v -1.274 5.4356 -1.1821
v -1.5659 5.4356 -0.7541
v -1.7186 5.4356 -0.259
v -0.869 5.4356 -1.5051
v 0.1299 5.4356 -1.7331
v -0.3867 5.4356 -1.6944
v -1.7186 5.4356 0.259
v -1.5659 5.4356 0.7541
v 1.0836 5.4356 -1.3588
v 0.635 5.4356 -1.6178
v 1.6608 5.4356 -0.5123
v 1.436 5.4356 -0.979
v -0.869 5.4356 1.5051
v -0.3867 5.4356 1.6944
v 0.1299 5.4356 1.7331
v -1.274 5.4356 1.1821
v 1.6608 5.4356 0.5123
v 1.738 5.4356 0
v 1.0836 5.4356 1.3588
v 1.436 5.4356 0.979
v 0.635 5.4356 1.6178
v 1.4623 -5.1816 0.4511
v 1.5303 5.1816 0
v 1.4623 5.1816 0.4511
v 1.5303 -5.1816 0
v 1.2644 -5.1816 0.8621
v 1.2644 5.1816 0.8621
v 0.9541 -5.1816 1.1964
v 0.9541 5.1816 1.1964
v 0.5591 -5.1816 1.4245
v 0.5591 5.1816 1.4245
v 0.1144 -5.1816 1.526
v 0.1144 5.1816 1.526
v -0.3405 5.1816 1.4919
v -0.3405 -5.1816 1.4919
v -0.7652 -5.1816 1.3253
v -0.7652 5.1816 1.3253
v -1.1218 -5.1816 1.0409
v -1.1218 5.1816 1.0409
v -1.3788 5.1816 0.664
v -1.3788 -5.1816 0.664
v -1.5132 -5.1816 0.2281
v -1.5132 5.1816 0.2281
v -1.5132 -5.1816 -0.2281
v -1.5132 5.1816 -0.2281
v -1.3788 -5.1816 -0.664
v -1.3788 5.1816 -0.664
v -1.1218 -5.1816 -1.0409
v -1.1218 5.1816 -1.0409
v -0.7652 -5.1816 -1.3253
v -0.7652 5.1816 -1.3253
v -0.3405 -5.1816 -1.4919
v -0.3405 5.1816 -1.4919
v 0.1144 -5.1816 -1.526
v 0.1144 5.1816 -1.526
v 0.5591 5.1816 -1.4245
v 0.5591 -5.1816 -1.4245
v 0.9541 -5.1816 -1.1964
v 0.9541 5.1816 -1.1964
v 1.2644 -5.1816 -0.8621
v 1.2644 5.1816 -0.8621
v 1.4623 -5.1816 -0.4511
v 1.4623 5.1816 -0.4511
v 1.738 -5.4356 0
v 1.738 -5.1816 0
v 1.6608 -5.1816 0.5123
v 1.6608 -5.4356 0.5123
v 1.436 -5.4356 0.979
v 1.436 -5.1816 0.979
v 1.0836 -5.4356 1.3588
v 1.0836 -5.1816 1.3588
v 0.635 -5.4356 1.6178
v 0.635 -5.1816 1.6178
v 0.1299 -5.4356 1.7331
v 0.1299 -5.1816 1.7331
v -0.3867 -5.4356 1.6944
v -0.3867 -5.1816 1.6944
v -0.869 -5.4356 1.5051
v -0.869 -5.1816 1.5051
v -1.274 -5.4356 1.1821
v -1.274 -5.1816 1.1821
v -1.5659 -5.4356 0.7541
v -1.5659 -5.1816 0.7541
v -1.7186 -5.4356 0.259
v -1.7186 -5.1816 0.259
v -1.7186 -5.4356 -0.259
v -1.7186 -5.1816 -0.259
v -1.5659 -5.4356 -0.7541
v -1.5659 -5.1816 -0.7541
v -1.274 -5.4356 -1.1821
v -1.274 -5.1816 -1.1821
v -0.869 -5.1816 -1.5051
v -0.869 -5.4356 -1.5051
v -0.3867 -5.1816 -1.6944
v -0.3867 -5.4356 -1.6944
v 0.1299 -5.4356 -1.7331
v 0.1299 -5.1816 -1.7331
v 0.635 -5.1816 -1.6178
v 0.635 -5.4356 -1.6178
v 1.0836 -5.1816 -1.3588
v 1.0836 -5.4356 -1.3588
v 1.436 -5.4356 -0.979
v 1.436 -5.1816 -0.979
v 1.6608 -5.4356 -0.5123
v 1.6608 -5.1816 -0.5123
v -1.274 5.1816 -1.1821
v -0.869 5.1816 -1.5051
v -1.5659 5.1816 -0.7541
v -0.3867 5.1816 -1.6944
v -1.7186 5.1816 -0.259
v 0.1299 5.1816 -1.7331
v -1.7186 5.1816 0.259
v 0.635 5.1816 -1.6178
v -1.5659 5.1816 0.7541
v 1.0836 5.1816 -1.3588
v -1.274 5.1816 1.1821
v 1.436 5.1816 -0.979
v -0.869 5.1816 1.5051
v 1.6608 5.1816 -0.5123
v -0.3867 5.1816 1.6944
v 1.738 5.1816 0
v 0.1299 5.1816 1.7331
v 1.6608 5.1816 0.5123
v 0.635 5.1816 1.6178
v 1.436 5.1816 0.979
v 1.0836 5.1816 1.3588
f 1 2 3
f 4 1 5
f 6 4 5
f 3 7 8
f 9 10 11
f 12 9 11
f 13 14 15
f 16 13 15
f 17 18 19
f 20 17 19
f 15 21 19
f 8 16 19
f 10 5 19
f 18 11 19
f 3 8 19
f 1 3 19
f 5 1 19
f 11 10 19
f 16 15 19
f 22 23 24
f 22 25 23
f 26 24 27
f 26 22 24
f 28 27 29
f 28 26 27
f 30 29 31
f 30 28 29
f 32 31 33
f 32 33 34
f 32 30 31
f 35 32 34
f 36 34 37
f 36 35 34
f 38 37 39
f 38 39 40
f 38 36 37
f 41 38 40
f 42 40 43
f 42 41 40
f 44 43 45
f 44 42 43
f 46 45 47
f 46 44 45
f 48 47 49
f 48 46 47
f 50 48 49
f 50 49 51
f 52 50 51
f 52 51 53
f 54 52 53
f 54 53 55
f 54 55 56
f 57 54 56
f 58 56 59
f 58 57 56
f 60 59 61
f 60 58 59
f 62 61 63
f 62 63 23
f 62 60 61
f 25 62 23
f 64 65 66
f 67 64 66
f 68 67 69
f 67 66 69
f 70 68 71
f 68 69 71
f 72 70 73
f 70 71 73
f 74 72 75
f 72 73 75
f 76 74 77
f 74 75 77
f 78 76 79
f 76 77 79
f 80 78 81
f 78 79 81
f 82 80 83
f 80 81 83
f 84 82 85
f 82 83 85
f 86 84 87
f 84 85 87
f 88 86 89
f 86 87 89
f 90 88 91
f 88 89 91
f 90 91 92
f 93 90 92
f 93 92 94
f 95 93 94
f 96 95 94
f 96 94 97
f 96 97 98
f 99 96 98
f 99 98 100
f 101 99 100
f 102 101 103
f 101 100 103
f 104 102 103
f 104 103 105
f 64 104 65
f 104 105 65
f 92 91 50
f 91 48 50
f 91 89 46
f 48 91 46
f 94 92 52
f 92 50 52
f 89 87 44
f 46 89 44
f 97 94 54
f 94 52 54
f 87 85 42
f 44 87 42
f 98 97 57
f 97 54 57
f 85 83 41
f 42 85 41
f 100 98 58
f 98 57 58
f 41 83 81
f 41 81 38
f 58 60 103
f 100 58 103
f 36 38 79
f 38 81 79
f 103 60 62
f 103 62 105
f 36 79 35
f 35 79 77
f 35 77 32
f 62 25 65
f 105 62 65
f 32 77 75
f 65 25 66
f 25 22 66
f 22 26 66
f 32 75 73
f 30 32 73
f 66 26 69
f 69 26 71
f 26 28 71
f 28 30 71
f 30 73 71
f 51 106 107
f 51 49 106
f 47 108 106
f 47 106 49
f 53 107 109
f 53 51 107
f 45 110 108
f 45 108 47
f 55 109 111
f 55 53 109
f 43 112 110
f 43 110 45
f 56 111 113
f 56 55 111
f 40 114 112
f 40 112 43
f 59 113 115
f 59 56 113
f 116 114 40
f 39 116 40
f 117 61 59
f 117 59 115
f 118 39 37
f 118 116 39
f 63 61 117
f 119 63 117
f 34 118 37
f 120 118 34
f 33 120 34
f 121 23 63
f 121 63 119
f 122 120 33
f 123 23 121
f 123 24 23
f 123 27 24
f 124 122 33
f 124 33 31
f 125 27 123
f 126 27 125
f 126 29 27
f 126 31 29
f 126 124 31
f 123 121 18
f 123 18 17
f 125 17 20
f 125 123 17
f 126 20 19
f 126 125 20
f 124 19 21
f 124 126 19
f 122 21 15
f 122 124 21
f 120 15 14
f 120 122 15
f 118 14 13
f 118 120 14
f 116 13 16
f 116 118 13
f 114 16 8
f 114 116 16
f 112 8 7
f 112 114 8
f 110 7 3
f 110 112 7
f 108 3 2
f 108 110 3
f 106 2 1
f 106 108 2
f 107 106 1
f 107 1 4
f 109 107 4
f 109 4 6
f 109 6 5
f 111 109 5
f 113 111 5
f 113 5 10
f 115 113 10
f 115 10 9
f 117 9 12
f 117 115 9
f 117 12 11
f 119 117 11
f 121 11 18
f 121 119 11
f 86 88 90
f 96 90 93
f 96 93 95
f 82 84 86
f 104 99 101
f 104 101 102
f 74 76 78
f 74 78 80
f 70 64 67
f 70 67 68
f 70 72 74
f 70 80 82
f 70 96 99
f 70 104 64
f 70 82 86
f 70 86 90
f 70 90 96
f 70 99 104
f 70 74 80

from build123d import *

# Parameters (mm, degrees)
F0_R          = 1.5303057729
F1_DEPTH      = 5.1816
F1_DEPTH_BACK = 5.1816
F2_R          = 1.7379746904
F3_DEPTH      = 0.254


# Not quite as in the source:
# - a pattern or mirror of a feature is missing from the dataset's text; its kind, count and spacing are read off the source's solid


with BuildPart() as f1:
    # F0 (on Front) → F1 (new body, two sides)
    with BuildSketch(Plane.XZ) as f1_sk:
        Circle(F0_R)
    extrude(amount=F1_DEPTH)
    extrude(f1_sk.sketch, amount=-F1_DEPTH_BACK)

    # F2 (on face) → F3 (join)
    with BuildSketch(Plane.XZ.offset(5.1816)):
        Circle(F2_R)
    f3 = extrude(amount=F3_DEPTH)

    # F3_copies: F3 across plane
    add(f3.mirror(Plane.ZX))


solid = f1.part
